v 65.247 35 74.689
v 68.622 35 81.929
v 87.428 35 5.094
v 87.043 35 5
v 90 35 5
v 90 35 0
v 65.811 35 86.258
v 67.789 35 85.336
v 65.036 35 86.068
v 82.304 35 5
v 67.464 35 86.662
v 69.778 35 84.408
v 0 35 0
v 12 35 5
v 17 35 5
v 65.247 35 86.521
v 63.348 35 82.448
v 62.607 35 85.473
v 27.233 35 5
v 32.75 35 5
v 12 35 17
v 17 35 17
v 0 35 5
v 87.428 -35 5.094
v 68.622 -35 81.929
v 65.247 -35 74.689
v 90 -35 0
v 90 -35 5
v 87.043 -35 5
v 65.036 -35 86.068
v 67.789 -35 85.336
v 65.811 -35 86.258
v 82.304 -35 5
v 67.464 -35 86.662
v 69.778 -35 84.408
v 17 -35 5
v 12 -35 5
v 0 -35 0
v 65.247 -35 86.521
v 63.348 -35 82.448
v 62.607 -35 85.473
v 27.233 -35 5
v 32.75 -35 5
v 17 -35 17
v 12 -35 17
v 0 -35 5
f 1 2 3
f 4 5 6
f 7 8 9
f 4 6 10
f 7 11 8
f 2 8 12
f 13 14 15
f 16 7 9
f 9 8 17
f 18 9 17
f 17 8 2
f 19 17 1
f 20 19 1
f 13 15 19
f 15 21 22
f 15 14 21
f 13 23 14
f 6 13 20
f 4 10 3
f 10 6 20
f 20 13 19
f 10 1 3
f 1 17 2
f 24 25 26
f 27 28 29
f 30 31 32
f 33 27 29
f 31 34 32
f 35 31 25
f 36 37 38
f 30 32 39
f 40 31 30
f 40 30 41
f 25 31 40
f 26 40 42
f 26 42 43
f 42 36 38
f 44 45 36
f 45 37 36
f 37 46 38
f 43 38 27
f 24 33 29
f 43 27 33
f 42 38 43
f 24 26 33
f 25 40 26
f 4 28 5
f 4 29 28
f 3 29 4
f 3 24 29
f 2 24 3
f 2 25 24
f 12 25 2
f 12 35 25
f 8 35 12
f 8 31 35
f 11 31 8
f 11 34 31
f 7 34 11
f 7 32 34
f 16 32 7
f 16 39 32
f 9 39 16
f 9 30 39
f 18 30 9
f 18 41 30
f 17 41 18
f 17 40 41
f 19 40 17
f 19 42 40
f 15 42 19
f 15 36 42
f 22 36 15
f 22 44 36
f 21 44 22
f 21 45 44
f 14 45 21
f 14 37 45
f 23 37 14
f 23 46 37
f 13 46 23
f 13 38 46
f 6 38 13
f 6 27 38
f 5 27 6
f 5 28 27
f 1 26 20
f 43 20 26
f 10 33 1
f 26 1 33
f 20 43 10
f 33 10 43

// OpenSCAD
// Forge catalog: phone / tablet stand (front lip, reclined back support, rear brace)
device_th = 10;   // device thickness incl. case (mm)
angle     = 65;   // recline angle of the back support from the table (deg)
width     = 70;   // stand width (mm)
back_h    = 90;   // length of the back support (mm)
base_d    = 90;   // base depth, front to back (mm)
wall      = 5;    // material thickness (mm)
lip       = 12;   // front lip height above the base (mm)
front     = 12;   // distance from the front edge to the lip (mm)
$fn = 32;

x0    = front + wall + device_th;              // where the back support starts
x_top = x0 + back_h * cos(angle);
y_top = wall + back_h * sin(angle);
bx    = max(base_d - wall, x0 + wall + 5);     // brace foot on the base
lb    = sqrt(pow(x_top - bx, 2) + pow(y_top - wall, 2));
phi   = atan2(y_top - wall, x_top - bx);
module profile() {
    square([max(base_d, x_top + wall), wall]);                                     // base
    translate([front, 0]) square([wall, lip + wall]);                              // front lip
    translate([x0, wall - 0.5]) rotate(-(90 - angle)) square([wall, back_h + 0.5]); // reclined back
    translate([bx, wall - 0.5]) rotate(phi) translate([0, -wall/2]) square([lb, wall]); // rear brace
}
rotate([90, 0, 0]) linear_extrude(height = width, center = true) profile();
